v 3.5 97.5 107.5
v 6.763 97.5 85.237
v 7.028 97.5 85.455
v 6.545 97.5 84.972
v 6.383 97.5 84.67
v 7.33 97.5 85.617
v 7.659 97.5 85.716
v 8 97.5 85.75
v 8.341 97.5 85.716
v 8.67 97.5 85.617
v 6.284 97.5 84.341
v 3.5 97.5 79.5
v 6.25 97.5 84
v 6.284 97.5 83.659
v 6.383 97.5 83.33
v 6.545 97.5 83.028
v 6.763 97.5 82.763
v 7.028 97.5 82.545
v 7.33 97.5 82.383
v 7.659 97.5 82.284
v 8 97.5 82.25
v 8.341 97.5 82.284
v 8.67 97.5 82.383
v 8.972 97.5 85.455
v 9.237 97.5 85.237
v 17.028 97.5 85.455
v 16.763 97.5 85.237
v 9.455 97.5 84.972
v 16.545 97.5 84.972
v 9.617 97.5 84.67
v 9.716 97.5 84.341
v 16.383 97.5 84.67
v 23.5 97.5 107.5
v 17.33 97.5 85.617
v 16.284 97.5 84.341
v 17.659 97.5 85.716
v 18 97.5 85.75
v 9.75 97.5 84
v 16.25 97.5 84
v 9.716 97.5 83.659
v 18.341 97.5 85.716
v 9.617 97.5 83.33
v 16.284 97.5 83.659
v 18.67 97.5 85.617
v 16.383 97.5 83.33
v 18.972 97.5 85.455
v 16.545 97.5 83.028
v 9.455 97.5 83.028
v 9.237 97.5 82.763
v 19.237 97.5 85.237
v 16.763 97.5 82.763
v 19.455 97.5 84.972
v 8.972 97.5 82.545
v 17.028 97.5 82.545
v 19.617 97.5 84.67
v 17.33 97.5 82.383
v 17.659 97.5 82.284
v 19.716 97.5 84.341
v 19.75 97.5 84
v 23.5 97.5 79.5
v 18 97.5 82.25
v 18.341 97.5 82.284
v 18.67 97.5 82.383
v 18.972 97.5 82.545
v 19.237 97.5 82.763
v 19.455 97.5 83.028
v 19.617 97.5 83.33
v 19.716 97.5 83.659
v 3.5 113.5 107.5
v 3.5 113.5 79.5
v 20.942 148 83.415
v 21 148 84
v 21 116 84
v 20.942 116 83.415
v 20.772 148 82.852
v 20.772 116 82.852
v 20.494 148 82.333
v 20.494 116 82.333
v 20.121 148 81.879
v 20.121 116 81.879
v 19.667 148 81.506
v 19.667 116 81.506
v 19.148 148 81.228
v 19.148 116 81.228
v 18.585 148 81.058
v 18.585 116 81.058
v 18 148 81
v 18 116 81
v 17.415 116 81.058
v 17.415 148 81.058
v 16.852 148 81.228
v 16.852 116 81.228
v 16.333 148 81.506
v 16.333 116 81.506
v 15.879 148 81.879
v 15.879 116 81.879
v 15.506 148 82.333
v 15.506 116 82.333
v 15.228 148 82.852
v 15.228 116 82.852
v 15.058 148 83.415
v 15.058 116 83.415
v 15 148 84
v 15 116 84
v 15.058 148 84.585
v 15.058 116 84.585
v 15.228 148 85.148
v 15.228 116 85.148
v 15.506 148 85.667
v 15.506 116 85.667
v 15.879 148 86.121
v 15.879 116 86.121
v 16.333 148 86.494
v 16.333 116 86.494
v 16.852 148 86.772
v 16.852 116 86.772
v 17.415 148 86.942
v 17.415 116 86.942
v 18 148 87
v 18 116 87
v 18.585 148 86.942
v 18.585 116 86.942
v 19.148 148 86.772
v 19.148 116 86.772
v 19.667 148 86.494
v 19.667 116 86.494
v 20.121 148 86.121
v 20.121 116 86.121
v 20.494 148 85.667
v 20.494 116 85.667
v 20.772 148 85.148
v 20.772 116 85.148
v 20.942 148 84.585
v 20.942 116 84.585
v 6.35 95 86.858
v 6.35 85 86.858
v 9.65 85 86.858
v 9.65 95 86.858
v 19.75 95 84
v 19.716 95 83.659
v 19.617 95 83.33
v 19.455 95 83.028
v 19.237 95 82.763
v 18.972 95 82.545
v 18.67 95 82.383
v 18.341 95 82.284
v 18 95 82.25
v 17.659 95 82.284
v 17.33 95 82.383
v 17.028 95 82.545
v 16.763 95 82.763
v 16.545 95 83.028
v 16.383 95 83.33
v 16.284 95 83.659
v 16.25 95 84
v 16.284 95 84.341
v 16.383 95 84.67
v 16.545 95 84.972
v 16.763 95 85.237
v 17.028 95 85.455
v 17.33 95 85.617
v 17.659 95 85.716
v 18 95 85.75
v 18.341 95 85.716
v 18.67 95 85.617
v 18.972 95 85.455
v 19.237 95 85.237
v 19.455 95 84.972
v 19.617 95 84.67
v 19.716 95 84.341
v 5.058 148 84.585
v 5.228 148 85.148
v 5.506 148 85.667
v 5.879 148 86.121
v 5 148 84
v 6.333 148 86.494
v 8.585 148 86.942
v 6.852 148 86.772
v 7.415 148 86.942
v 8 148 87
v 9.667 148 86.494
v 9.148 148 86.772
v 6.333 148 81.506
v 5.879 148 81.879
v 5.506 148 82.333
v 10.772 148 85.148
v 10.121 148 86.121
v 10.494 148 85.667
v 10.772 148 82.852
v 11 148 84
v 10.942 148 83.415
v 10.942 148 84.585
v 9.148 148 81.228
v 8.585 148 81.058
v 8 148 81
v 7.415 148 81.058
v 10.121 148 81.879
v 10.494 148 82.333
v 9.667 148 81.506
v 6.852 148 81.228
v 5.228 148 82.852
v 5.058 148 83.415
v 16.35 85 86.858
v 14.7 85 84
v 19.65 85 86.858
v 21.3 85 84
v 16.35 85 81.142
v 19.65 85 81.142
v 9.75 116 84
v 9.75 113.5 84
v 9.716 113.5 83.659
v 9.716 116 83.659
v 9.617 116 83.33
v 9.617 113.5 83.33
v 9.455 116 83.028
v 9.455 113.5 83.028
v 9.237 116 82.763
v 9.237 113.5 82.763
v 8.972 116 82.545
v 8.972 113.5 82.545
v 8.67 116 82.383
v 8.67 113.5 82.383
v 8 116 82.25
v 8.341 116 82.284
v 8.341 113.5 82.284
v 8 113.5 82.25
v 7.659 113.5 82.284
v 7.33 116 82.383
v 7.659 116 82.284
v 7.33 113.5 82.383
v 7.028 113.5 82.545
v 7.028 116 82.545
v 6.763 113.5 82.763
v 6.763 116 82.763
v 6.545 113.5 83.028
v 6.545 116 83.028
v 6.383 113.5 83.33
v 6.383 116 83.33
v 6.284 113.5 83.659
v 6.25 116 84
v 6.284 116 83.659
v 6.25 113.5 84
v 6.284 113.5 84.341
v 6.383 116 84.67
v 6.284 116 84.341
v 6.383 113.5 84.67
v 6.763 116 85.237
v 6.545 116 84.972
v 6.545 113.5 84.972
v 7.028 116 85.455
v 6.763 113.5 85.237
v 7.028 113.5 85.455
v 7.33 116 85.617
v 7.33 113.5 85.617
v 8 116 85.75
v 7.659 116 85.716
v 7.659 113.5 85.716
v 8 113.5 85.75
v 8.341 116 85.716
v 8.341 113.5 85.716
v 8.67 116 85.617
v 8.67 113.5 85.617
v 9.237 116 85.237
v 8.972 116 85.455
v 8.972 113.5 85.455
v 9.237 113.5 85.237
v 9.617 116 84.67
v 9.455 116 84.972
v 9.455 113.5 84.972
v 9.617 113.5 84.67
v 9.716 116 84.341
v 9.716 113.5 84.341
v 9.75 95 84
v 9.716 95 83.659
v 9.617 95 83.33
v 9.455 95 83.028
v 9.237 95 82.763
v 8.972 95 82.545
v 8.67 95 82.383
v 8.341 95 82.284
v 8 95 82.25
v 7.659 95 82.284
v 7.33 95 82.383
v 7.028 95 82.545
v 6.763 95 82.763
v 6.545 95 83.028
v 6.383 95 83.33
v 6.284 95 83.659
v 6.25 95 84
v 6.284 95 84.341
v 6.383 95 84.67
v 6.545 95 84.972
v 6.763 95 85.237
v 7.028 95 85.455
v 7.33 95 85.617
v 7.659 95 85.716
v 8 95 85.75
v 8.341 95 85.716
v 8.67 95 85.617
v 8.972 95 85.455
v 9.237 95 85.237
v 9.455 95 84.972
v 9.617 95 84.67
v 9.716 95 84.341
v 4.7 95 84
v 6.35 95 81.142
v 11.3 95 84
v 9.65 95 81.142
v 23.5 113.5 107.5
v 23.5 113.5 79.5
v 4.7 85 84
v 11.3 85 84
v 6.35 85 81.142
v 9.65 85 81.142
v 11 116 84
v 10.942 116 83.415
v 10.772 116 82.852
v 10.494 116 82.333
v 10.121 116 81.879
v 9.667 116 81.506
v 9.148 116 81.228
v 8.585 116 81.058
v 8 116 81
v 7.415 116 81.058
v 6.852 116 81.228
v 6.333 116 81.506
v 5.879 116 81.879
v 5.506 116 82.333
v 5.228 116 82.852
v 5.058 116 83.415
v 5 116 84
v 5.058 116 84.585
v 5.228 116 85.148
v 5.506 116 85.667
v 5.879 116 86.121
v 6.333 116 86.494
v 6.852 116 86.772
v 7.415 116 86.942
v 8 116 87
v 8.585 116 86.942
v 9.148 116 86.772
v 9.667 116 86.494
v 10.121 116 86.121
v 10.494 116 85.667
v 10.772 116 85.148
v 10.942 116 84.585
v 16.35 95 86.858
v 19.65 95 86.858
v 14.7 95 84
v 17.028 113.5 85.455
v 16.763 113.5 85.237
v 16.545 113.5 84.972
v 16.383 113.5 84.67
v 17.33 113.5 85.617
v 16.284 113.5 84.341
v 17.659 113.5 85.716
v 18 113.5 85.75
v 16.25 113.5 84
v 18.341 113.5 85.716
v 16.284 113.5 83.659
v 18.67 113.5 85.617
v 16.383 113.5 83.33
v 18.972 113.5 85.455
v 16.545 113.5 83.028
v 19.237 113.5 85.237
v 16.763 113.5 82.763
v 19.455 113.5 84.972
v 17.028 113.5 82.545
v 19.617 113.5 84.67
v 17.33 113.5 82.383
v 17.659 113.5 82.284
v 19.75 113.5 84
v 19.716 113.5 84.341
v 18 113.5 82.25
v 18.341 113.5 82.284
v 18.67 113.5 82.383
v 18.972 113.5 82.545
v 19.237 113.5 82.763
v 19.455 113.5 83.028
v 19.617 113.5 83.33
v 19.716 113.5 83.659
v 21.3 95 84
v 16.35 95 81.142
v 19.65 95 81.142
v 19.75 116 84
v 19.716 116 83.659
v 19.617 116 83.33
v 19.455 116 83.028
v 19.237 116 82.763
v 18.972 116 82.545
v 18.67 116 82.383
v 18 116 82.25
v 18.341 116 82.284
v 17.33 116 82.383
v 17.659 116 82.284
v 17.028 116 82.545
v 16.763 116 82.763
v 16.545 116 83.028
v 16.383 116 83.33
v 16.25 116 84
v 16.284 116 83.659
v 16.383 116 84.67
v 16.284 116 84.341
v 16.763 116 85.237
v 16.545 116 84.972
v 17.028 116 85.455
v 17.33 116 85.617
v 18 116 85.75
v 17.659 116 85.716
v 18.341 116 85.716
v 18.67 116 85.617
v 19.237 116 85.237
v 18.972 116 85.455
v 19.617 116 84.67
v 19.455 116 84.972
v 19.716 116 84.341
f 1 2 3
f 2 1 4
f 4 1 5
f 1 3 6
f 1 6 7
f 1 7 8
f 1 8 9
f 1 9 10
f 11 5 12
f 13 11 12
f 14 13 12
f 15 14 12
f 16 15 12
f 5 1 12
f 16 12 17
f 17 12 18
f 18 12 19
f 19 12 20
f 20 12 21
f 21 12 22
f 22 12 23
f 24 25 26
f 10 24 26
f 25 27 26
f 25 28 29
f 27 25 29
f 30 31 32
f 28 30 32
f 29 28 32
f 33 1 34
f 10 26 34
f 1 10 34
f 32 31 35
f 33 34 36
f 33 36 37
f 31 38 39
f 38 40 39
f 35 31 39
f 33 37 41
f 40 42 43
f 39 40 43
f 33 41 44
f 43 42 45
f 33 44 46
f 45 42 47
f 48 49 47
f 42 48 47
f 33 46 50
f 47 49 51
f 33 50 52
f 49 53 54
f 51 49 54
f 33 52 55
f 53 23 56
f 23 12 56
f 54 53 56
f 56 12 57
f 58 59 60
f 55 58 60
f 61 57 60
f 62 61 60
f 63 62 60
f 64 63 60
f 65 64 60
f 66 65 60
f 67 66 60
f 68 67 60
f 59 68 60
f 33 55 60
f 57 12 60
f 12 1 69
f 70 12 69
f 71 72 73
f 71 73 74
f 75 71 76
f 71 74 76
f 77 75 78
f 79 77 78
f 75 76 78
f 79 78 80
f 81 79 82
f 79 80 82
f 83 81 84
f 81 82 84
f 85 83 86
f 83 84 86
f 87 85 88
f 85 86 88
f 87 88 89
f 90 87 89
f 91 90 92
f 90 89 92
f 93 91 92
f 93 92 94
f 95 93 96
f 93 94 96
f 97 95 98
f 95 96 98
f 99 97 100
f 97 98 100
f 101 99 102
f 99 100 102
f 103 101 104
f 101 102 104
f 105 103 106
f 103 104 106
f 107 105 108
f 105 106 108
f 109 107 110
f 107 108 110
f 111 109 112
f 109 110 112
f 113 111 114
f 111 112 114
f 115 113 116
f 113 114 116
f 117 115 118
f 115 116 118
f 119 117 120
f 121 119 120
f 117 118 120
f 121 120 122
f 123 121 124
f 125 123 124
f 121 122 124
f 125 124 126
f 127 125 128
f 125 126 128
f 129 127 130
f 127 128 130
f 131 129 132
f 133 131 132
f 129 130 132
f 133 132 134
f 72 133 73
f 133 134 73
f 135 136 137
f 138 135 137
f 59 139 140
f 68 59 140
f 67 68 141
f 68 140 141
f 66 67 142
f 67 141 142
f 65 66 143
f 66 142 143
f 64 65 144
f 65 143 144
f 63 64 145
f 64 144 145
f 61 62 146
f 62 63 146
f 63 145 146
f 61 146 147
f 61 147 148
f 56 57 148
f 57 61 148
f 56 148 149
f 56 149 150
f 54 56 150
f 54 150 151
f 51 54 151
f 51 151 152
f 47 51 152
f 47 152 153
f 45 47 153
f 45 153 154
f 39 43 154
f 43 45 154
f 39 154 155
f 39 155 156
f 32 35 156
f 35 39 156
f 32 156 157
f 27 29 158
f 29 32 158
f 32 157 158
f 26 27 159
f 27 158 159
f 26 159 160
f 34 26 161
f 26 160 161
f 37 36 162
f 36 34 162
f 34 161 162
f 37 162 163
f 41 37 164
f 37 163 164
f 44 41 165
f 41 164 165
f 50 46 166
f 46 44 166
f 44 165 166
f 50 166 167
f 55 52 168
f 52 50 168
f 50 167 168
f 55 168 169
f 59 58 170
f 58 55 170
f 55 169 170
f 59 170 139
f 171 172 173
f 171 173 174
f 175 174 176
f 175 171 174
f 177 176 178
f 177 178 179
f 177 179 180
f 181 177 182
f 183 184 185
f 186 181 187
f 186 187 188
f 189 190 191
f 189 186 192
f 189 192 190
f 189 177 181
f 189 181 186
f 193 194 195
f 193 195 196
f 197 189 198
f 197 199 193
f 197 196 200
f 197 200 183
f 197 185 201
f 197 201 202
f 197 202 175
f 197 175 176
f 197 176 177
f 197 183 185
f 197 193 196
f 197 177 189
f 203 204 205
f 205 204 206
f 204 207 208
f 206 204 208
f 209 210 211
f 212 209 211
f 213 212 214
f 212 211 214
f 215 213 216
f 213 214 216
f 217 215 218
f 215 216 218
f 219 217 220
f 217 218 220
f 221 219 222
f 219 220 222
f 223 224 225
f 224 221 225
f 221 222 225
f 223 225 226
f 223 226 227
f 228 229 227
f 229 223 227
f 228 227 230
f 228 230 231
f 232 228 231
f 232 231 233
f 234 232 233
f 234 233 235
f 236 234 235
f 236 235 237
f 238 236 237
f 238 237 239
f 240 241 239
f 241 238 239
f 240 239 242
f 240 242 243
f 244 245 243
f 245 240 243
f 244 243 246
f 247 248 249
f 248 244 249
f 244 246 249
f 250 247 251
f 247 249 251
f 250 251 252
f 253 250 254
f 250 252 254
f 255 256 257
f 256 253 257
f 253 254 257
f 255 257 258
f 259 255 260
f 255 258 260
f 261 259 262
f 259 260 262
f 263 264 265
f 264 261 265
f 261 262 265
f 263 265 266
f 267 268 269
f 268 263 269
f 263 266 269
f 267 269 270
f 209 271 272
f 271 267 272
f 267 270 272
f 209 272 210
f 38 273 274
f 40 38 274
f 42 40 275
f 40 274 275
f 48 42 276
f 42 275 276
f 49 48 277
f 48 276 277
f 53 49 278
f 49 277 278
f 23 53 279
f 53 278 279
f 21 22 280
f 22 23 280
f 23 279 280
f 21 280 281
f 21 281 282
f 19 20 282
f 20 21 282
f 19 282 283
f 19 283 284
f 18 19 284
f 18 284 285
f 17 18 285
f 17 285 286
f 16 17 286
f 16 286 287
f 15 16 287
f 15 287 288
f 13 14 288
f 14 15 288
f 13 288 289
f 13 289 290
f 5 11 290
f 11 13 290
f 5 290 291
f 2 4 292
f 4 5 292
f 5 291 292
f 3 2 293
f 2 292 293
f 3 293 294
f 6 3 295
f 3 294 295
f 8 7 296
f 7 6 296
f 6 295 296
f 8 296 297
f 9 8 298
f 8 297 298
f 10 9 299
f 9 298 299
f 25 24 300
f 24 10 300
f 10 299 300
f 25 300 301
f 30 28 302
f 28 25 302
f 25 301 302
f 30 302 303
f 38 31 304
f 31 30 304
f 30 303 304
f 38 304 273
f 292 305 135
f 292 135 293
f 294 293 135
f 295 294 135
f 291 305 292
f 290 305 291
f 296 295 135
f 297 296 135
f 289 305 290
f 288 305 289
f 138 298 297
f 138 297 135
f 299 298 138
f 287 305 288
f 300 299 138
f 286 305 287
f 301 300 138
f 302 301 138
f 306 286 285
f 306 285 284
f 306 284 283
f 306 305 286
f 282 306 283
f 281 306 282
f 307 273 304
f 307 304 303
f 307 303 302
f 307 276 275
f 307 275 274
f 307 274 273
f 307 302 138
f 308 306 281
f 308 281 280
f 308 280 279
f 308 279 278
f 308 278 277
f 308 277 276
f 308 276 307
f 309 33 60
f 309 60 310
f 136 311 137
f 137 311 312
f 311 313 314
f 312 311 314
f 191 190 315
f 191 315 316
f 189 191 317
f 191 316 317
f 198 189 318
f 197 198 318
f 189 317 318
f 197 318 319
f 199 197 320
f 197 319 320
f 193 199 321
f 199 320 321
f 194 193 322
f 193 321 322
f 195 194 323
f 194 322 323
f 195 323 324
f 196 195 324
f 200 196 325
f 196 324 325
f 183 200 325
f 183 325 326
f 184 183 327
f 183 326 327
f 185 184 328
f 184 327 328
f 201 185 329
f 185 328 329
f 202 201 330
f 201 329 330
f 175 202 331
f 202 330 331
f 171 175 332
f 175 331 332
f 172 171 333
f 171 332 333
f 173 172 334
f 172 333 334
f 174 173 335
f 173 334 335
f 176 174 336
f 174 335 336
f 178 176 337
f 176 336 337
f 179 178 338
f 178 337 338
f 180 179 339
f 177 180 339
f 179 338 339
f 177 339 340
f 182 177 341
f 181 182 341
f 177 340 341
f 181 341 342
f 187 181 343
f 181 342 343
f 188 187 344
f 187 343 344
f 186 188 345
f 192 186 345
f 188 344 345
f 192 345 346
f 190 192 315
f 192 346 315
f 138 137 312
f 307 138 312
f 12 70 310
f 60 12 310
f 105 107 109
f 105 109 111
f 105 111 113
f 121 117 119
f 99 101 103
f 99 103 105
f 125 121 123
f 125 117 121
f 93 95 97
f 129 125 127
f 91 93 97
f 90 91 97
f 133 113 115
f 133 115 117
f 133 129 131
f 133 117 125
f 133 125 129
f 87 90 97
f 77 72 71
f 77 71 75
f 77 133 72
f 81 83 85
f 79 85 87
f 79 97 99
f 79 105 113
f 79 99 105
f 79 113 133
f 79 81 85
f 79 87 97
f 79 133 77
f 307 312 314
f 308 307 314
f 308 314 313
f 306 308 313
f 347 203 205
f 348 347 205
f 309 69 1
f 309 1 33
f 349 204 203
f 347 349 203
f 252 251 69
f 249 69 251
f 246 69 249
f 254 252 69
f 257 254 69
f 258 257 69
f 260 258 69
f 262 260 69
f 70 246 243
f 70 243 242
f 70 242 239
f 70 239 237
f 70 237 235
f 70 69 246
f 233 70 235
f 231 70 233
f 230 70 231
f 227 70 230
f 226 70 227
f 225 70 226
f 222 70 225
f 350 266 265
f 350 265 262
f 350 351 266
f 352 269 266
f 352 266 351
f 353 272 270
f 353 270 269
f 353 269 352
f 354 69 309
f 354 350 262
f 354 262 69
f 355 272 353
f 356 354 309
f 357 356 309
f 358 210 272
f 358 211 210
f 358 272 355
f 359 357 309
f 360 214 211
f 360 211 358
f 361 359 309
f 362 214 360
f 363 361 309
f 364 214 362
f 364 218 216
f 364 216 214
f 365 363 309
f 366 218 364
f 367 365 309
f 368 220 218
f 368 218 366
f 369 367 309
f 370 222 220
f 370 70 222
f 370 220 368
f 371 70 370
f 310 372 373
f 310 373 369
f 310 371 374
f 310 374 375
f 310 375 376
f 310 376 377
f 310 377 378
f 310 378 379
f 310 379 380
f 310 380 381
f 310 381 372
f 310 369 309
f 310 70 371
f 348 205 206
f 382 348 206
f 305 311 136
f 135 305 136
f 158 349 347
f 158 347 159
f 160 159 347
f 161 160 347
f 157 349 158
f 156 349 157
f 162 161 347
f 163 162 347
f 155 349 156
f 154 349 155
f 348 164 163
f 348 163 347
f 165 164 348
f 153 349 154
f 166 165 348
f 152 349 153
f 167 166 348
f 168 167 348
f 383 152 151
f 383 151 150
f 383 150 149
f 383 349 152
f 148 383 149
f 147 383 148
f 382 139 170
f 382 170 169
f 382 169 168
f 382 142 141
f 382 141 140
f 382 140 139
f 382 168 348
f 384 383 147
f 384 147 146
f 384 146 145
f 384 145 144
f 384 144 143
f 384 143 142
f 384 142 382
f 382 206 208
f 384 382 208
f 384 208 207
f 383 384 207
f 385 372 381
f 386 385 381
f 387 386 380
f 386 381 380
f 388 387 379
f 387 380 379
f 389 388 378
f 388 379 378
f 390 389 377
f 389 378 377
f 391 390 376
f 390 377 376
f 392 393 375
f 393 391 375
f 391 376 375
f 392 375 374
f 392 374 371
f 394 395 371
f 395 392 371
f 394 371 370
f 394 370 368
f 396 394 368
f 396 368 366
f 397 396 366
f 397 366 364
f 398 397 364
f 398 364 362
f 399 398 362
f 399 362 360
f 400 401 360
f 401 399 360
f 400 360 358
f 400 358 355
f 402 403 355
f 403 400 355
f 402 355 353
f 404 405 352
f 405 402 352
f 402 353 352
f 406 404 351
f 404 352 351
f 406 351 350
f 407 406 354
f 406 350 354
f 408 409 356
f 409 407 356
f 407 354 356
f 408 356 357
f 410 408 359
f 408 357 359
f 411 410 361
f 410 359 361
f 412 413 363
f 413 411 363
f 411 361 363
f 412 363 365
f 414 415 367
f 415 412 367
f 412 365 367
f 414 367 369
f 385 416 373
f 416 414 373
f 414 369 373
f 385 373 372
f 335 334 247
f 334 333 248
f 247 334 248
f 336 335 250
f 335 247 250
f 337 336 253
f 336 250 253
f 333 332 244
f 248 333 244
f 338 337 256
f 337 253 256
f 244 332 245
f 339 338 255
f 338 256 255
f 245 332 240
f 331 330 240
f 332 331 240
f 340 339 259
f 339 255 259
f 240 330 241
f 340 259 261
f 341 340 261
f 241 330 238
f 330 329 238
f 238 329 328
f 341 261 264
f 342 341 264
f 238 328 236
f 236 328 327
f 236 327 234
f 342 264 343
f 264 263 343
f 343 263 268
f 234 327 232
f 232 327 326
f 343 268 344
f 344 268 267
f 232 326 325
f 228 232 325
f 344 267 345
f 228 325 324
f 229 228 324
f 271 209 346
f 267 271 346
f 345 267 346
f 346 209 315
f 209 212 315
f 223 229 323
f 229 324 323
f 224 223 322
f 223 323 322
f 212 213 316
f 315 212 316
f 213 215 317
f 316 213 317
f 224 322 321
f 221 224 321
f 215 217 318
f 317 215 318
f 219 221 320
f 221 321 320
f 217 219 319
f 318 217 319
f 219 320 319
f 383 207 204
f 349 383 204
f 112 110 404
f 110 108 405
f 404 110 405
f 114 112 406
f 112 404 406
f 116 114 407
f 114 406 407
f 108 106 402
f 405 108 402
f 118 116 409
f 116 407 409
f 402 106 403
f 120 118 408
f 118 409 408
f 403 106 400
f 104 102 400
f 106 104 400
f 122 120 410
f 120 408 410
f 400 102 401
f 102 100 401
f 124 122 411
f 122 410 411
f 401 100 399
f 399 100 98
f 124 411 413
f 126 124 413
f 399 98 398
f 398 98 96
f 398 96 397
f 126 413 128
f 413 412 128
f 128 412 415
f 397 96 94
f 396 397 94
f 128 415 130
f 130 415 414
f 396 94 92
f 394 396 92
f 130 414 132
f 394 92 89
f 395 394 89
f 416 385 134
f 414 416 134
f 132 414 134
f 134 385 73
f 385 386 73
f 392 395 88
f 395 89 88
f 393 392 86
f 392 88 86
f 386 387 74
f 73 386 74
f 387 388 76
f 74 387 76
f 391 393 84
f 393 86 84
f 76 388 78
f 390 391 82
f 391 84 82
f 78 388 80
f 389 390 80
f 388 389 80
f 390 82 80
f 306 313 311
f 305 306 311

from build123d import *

# Parameters (mm, degrees)
PRISM002_DEPTH         = 10
PRISM002_ROLL_ANGLE    = -90
CYLINDER051_R          = 3
CYLINDER051_DEPTH      = 32
CYLINDER051_ROLL_ANGLE = -90
CYLINDER052_R          = 3
CYLINDER052_DEPTH      = 32
CYLINDER052_ROLL_ANGLE = -90
BOX040_W               = 20
BOX040_H               = 16
BOX040_DEPTH           = 28
CYLINDER053_R          = 1.75
CYLINDER053_DEPTH      = 32
CYLINDER053_ROLL_ANGLE = -90
CYLINDER054_R          = 1.75
CYLINDER054_DEPTH      = 32
CYLINDER054_ROLL_ANGLE = -90
PRISM001_DEPTH         = 10
PRISM001_ROLL_ANGLE    = -90


with BuildPart() as prisma002:
    # Prism002 → Prism002 (new body)
    with BuildSketch(Plane.XY):
        Polygon((3.3, 0), (1.65, 2.857884), (-1.65, 2.857884), (-3.3, 0), (-1.65, -2.857884), (1.65, -2.857884), align=None)
    extrude(amount=PRISM002_DEPTH)


with BuildPart() as prisma002_1:
    # Prism002 roll: moved
    add(prisma002.part.rotate(Axis((0, 0, 0), (1, 0, 0)), PRISM002_ROLL_ANGLE))


with BuildPart() as prisma002_2:
    # Prism002 placement: moved
    add(prisma002_1.part.moved(Location((8, 85, 84))))


with BuildPart() as cilindro017:
    # Cylinder051 → Cylinder051 (new body)
    with BuildSketch(Plane.XY):
        Circle(CYLINDER051_R)
    extrude(amount=CYLINDER051_DEPTH)


with BuildPart() as cilindro017_1:
    # Cylinder051 roll: moved
    add(cilindro017.part.rotate(Axis((0, 0, 0), (1, 0, 0)), CYLINDER051_ROLL_ANGLE))


with BuildPart() as cilindro017_2:
    # Cylinder051 placement: moved
    add(cilindro017_1.part.moved(Location((18, 116, 84))))


with BuildPart() as cilindro018:
    # Cylinder052 → Cylinder052 (new body)
    with BuildSketch(Plane.XY):
        Circle(CYLINDER052_R)
    extrude(amount=CYLINDER052_DEPTH)


with BuildPart() as cilindro018_1:
    # Cylinder052 roll: moved
    add(cilindro018.part.rotate(Axis((0, 0, 0), (1, 0, 0)), CYLINDER052_ROLL_ANGLE))


with BuildPart() as cilindro018_2:
    # Cylinder052 placement: moved
    add(cilindro018_1.part.moved(Location((8, 116, 84))))


with BuildPart() as cubo005:
    # Box040 → Box040 (new body)
    with BuildSketch(Plane(origin=(3.5, 97.5, 79.5), x_dir=(1, 0, 0), z_dir=(0, 0, 1))):
        with Locations((10, 8)):
            Rectangle(BOX040_W, BOX040_H)
    extrude(amount=BOX040_DEPTH)


with BuildPart() as cilindro013:
    # Cylinder053 → Cylinder053 (new body)
    with BuildSketch(Plane.XY):
        Circle(CYLINDER053_R)
    extrude(amount=CYLINDER053_DEPTH)


with BuildPart() as cilindro013_1:
    # Cylinder053 roll: moved
    add(cilindro013.part.rotate(Axis((0, 0, 0), (1, 0, 0)), CYLINDER053_ROLL_ANGLE))


with BuildPart() as cilindro013_2:
    # Cylinder053 placement: moved
    add(cilindro013_1.part.moved(Location((18, 90, 84))))


with BuildPart() as cilindro012:
    # Cylinder054 → Cylinder054 (new body)
    with BuildSketch(Plane.XY):
        Circle(CYLINDER054_R)
    extrude(amount=CYLINDER054_DEPTH)


with BuildPart() as cilindro012_1:
    # Cylinder054 roll: moved
    add(cilindro012.part.rotate(Axis((0, 0, 0), (1, 0, 0)), CYLINDER054_ROLL_ANGLE))


with BuildPart() as cilindro012_2:
    # Cylinder054 placement: moved
    add(cilindro012_1.part.moved(Location((8, 90, 84))))


with BuildPart() as arm_positive_cut:
    # Prism001 → Prism001 (new body)
    with BuildSketch(Plane.XY):
        Polygon((3.3, 0), (1.65, 2.857884), (-1.65, 2.857884), (-3.3, 0), (-1.65, -2.857884), (1.65, -2.857884), align=None)
    extrude(amount=PRISM001_DEPTH)


with BuildPart() as arm_positive_cut_1:
    # Prism001 roll: moved
    add(arm_positive_cut.part.rotate(Axis((0, 0, 0), (1, 0, 0)), PRISM001_ROLL_ANGLE))


with BuildPart() as arm_positive_cut_2:
    # Prism001 placement: moved
    add(arm_positive_cut_1.part.moved(Location((18, 85, 84))))

    # Fusion036: union Prisma002, Cilindro017, Cilindro018, Cubo005, Cilindro013, Cilindro012
    add(prisma002_2.part)
    add(cilindro017_2.part)
    add(cilindro018_2.part)
    add(cubo005.part)
    add(cilindro013_2.part)
    add(cilindro012_2.part)


solid = arm_positive_cut_2.part
